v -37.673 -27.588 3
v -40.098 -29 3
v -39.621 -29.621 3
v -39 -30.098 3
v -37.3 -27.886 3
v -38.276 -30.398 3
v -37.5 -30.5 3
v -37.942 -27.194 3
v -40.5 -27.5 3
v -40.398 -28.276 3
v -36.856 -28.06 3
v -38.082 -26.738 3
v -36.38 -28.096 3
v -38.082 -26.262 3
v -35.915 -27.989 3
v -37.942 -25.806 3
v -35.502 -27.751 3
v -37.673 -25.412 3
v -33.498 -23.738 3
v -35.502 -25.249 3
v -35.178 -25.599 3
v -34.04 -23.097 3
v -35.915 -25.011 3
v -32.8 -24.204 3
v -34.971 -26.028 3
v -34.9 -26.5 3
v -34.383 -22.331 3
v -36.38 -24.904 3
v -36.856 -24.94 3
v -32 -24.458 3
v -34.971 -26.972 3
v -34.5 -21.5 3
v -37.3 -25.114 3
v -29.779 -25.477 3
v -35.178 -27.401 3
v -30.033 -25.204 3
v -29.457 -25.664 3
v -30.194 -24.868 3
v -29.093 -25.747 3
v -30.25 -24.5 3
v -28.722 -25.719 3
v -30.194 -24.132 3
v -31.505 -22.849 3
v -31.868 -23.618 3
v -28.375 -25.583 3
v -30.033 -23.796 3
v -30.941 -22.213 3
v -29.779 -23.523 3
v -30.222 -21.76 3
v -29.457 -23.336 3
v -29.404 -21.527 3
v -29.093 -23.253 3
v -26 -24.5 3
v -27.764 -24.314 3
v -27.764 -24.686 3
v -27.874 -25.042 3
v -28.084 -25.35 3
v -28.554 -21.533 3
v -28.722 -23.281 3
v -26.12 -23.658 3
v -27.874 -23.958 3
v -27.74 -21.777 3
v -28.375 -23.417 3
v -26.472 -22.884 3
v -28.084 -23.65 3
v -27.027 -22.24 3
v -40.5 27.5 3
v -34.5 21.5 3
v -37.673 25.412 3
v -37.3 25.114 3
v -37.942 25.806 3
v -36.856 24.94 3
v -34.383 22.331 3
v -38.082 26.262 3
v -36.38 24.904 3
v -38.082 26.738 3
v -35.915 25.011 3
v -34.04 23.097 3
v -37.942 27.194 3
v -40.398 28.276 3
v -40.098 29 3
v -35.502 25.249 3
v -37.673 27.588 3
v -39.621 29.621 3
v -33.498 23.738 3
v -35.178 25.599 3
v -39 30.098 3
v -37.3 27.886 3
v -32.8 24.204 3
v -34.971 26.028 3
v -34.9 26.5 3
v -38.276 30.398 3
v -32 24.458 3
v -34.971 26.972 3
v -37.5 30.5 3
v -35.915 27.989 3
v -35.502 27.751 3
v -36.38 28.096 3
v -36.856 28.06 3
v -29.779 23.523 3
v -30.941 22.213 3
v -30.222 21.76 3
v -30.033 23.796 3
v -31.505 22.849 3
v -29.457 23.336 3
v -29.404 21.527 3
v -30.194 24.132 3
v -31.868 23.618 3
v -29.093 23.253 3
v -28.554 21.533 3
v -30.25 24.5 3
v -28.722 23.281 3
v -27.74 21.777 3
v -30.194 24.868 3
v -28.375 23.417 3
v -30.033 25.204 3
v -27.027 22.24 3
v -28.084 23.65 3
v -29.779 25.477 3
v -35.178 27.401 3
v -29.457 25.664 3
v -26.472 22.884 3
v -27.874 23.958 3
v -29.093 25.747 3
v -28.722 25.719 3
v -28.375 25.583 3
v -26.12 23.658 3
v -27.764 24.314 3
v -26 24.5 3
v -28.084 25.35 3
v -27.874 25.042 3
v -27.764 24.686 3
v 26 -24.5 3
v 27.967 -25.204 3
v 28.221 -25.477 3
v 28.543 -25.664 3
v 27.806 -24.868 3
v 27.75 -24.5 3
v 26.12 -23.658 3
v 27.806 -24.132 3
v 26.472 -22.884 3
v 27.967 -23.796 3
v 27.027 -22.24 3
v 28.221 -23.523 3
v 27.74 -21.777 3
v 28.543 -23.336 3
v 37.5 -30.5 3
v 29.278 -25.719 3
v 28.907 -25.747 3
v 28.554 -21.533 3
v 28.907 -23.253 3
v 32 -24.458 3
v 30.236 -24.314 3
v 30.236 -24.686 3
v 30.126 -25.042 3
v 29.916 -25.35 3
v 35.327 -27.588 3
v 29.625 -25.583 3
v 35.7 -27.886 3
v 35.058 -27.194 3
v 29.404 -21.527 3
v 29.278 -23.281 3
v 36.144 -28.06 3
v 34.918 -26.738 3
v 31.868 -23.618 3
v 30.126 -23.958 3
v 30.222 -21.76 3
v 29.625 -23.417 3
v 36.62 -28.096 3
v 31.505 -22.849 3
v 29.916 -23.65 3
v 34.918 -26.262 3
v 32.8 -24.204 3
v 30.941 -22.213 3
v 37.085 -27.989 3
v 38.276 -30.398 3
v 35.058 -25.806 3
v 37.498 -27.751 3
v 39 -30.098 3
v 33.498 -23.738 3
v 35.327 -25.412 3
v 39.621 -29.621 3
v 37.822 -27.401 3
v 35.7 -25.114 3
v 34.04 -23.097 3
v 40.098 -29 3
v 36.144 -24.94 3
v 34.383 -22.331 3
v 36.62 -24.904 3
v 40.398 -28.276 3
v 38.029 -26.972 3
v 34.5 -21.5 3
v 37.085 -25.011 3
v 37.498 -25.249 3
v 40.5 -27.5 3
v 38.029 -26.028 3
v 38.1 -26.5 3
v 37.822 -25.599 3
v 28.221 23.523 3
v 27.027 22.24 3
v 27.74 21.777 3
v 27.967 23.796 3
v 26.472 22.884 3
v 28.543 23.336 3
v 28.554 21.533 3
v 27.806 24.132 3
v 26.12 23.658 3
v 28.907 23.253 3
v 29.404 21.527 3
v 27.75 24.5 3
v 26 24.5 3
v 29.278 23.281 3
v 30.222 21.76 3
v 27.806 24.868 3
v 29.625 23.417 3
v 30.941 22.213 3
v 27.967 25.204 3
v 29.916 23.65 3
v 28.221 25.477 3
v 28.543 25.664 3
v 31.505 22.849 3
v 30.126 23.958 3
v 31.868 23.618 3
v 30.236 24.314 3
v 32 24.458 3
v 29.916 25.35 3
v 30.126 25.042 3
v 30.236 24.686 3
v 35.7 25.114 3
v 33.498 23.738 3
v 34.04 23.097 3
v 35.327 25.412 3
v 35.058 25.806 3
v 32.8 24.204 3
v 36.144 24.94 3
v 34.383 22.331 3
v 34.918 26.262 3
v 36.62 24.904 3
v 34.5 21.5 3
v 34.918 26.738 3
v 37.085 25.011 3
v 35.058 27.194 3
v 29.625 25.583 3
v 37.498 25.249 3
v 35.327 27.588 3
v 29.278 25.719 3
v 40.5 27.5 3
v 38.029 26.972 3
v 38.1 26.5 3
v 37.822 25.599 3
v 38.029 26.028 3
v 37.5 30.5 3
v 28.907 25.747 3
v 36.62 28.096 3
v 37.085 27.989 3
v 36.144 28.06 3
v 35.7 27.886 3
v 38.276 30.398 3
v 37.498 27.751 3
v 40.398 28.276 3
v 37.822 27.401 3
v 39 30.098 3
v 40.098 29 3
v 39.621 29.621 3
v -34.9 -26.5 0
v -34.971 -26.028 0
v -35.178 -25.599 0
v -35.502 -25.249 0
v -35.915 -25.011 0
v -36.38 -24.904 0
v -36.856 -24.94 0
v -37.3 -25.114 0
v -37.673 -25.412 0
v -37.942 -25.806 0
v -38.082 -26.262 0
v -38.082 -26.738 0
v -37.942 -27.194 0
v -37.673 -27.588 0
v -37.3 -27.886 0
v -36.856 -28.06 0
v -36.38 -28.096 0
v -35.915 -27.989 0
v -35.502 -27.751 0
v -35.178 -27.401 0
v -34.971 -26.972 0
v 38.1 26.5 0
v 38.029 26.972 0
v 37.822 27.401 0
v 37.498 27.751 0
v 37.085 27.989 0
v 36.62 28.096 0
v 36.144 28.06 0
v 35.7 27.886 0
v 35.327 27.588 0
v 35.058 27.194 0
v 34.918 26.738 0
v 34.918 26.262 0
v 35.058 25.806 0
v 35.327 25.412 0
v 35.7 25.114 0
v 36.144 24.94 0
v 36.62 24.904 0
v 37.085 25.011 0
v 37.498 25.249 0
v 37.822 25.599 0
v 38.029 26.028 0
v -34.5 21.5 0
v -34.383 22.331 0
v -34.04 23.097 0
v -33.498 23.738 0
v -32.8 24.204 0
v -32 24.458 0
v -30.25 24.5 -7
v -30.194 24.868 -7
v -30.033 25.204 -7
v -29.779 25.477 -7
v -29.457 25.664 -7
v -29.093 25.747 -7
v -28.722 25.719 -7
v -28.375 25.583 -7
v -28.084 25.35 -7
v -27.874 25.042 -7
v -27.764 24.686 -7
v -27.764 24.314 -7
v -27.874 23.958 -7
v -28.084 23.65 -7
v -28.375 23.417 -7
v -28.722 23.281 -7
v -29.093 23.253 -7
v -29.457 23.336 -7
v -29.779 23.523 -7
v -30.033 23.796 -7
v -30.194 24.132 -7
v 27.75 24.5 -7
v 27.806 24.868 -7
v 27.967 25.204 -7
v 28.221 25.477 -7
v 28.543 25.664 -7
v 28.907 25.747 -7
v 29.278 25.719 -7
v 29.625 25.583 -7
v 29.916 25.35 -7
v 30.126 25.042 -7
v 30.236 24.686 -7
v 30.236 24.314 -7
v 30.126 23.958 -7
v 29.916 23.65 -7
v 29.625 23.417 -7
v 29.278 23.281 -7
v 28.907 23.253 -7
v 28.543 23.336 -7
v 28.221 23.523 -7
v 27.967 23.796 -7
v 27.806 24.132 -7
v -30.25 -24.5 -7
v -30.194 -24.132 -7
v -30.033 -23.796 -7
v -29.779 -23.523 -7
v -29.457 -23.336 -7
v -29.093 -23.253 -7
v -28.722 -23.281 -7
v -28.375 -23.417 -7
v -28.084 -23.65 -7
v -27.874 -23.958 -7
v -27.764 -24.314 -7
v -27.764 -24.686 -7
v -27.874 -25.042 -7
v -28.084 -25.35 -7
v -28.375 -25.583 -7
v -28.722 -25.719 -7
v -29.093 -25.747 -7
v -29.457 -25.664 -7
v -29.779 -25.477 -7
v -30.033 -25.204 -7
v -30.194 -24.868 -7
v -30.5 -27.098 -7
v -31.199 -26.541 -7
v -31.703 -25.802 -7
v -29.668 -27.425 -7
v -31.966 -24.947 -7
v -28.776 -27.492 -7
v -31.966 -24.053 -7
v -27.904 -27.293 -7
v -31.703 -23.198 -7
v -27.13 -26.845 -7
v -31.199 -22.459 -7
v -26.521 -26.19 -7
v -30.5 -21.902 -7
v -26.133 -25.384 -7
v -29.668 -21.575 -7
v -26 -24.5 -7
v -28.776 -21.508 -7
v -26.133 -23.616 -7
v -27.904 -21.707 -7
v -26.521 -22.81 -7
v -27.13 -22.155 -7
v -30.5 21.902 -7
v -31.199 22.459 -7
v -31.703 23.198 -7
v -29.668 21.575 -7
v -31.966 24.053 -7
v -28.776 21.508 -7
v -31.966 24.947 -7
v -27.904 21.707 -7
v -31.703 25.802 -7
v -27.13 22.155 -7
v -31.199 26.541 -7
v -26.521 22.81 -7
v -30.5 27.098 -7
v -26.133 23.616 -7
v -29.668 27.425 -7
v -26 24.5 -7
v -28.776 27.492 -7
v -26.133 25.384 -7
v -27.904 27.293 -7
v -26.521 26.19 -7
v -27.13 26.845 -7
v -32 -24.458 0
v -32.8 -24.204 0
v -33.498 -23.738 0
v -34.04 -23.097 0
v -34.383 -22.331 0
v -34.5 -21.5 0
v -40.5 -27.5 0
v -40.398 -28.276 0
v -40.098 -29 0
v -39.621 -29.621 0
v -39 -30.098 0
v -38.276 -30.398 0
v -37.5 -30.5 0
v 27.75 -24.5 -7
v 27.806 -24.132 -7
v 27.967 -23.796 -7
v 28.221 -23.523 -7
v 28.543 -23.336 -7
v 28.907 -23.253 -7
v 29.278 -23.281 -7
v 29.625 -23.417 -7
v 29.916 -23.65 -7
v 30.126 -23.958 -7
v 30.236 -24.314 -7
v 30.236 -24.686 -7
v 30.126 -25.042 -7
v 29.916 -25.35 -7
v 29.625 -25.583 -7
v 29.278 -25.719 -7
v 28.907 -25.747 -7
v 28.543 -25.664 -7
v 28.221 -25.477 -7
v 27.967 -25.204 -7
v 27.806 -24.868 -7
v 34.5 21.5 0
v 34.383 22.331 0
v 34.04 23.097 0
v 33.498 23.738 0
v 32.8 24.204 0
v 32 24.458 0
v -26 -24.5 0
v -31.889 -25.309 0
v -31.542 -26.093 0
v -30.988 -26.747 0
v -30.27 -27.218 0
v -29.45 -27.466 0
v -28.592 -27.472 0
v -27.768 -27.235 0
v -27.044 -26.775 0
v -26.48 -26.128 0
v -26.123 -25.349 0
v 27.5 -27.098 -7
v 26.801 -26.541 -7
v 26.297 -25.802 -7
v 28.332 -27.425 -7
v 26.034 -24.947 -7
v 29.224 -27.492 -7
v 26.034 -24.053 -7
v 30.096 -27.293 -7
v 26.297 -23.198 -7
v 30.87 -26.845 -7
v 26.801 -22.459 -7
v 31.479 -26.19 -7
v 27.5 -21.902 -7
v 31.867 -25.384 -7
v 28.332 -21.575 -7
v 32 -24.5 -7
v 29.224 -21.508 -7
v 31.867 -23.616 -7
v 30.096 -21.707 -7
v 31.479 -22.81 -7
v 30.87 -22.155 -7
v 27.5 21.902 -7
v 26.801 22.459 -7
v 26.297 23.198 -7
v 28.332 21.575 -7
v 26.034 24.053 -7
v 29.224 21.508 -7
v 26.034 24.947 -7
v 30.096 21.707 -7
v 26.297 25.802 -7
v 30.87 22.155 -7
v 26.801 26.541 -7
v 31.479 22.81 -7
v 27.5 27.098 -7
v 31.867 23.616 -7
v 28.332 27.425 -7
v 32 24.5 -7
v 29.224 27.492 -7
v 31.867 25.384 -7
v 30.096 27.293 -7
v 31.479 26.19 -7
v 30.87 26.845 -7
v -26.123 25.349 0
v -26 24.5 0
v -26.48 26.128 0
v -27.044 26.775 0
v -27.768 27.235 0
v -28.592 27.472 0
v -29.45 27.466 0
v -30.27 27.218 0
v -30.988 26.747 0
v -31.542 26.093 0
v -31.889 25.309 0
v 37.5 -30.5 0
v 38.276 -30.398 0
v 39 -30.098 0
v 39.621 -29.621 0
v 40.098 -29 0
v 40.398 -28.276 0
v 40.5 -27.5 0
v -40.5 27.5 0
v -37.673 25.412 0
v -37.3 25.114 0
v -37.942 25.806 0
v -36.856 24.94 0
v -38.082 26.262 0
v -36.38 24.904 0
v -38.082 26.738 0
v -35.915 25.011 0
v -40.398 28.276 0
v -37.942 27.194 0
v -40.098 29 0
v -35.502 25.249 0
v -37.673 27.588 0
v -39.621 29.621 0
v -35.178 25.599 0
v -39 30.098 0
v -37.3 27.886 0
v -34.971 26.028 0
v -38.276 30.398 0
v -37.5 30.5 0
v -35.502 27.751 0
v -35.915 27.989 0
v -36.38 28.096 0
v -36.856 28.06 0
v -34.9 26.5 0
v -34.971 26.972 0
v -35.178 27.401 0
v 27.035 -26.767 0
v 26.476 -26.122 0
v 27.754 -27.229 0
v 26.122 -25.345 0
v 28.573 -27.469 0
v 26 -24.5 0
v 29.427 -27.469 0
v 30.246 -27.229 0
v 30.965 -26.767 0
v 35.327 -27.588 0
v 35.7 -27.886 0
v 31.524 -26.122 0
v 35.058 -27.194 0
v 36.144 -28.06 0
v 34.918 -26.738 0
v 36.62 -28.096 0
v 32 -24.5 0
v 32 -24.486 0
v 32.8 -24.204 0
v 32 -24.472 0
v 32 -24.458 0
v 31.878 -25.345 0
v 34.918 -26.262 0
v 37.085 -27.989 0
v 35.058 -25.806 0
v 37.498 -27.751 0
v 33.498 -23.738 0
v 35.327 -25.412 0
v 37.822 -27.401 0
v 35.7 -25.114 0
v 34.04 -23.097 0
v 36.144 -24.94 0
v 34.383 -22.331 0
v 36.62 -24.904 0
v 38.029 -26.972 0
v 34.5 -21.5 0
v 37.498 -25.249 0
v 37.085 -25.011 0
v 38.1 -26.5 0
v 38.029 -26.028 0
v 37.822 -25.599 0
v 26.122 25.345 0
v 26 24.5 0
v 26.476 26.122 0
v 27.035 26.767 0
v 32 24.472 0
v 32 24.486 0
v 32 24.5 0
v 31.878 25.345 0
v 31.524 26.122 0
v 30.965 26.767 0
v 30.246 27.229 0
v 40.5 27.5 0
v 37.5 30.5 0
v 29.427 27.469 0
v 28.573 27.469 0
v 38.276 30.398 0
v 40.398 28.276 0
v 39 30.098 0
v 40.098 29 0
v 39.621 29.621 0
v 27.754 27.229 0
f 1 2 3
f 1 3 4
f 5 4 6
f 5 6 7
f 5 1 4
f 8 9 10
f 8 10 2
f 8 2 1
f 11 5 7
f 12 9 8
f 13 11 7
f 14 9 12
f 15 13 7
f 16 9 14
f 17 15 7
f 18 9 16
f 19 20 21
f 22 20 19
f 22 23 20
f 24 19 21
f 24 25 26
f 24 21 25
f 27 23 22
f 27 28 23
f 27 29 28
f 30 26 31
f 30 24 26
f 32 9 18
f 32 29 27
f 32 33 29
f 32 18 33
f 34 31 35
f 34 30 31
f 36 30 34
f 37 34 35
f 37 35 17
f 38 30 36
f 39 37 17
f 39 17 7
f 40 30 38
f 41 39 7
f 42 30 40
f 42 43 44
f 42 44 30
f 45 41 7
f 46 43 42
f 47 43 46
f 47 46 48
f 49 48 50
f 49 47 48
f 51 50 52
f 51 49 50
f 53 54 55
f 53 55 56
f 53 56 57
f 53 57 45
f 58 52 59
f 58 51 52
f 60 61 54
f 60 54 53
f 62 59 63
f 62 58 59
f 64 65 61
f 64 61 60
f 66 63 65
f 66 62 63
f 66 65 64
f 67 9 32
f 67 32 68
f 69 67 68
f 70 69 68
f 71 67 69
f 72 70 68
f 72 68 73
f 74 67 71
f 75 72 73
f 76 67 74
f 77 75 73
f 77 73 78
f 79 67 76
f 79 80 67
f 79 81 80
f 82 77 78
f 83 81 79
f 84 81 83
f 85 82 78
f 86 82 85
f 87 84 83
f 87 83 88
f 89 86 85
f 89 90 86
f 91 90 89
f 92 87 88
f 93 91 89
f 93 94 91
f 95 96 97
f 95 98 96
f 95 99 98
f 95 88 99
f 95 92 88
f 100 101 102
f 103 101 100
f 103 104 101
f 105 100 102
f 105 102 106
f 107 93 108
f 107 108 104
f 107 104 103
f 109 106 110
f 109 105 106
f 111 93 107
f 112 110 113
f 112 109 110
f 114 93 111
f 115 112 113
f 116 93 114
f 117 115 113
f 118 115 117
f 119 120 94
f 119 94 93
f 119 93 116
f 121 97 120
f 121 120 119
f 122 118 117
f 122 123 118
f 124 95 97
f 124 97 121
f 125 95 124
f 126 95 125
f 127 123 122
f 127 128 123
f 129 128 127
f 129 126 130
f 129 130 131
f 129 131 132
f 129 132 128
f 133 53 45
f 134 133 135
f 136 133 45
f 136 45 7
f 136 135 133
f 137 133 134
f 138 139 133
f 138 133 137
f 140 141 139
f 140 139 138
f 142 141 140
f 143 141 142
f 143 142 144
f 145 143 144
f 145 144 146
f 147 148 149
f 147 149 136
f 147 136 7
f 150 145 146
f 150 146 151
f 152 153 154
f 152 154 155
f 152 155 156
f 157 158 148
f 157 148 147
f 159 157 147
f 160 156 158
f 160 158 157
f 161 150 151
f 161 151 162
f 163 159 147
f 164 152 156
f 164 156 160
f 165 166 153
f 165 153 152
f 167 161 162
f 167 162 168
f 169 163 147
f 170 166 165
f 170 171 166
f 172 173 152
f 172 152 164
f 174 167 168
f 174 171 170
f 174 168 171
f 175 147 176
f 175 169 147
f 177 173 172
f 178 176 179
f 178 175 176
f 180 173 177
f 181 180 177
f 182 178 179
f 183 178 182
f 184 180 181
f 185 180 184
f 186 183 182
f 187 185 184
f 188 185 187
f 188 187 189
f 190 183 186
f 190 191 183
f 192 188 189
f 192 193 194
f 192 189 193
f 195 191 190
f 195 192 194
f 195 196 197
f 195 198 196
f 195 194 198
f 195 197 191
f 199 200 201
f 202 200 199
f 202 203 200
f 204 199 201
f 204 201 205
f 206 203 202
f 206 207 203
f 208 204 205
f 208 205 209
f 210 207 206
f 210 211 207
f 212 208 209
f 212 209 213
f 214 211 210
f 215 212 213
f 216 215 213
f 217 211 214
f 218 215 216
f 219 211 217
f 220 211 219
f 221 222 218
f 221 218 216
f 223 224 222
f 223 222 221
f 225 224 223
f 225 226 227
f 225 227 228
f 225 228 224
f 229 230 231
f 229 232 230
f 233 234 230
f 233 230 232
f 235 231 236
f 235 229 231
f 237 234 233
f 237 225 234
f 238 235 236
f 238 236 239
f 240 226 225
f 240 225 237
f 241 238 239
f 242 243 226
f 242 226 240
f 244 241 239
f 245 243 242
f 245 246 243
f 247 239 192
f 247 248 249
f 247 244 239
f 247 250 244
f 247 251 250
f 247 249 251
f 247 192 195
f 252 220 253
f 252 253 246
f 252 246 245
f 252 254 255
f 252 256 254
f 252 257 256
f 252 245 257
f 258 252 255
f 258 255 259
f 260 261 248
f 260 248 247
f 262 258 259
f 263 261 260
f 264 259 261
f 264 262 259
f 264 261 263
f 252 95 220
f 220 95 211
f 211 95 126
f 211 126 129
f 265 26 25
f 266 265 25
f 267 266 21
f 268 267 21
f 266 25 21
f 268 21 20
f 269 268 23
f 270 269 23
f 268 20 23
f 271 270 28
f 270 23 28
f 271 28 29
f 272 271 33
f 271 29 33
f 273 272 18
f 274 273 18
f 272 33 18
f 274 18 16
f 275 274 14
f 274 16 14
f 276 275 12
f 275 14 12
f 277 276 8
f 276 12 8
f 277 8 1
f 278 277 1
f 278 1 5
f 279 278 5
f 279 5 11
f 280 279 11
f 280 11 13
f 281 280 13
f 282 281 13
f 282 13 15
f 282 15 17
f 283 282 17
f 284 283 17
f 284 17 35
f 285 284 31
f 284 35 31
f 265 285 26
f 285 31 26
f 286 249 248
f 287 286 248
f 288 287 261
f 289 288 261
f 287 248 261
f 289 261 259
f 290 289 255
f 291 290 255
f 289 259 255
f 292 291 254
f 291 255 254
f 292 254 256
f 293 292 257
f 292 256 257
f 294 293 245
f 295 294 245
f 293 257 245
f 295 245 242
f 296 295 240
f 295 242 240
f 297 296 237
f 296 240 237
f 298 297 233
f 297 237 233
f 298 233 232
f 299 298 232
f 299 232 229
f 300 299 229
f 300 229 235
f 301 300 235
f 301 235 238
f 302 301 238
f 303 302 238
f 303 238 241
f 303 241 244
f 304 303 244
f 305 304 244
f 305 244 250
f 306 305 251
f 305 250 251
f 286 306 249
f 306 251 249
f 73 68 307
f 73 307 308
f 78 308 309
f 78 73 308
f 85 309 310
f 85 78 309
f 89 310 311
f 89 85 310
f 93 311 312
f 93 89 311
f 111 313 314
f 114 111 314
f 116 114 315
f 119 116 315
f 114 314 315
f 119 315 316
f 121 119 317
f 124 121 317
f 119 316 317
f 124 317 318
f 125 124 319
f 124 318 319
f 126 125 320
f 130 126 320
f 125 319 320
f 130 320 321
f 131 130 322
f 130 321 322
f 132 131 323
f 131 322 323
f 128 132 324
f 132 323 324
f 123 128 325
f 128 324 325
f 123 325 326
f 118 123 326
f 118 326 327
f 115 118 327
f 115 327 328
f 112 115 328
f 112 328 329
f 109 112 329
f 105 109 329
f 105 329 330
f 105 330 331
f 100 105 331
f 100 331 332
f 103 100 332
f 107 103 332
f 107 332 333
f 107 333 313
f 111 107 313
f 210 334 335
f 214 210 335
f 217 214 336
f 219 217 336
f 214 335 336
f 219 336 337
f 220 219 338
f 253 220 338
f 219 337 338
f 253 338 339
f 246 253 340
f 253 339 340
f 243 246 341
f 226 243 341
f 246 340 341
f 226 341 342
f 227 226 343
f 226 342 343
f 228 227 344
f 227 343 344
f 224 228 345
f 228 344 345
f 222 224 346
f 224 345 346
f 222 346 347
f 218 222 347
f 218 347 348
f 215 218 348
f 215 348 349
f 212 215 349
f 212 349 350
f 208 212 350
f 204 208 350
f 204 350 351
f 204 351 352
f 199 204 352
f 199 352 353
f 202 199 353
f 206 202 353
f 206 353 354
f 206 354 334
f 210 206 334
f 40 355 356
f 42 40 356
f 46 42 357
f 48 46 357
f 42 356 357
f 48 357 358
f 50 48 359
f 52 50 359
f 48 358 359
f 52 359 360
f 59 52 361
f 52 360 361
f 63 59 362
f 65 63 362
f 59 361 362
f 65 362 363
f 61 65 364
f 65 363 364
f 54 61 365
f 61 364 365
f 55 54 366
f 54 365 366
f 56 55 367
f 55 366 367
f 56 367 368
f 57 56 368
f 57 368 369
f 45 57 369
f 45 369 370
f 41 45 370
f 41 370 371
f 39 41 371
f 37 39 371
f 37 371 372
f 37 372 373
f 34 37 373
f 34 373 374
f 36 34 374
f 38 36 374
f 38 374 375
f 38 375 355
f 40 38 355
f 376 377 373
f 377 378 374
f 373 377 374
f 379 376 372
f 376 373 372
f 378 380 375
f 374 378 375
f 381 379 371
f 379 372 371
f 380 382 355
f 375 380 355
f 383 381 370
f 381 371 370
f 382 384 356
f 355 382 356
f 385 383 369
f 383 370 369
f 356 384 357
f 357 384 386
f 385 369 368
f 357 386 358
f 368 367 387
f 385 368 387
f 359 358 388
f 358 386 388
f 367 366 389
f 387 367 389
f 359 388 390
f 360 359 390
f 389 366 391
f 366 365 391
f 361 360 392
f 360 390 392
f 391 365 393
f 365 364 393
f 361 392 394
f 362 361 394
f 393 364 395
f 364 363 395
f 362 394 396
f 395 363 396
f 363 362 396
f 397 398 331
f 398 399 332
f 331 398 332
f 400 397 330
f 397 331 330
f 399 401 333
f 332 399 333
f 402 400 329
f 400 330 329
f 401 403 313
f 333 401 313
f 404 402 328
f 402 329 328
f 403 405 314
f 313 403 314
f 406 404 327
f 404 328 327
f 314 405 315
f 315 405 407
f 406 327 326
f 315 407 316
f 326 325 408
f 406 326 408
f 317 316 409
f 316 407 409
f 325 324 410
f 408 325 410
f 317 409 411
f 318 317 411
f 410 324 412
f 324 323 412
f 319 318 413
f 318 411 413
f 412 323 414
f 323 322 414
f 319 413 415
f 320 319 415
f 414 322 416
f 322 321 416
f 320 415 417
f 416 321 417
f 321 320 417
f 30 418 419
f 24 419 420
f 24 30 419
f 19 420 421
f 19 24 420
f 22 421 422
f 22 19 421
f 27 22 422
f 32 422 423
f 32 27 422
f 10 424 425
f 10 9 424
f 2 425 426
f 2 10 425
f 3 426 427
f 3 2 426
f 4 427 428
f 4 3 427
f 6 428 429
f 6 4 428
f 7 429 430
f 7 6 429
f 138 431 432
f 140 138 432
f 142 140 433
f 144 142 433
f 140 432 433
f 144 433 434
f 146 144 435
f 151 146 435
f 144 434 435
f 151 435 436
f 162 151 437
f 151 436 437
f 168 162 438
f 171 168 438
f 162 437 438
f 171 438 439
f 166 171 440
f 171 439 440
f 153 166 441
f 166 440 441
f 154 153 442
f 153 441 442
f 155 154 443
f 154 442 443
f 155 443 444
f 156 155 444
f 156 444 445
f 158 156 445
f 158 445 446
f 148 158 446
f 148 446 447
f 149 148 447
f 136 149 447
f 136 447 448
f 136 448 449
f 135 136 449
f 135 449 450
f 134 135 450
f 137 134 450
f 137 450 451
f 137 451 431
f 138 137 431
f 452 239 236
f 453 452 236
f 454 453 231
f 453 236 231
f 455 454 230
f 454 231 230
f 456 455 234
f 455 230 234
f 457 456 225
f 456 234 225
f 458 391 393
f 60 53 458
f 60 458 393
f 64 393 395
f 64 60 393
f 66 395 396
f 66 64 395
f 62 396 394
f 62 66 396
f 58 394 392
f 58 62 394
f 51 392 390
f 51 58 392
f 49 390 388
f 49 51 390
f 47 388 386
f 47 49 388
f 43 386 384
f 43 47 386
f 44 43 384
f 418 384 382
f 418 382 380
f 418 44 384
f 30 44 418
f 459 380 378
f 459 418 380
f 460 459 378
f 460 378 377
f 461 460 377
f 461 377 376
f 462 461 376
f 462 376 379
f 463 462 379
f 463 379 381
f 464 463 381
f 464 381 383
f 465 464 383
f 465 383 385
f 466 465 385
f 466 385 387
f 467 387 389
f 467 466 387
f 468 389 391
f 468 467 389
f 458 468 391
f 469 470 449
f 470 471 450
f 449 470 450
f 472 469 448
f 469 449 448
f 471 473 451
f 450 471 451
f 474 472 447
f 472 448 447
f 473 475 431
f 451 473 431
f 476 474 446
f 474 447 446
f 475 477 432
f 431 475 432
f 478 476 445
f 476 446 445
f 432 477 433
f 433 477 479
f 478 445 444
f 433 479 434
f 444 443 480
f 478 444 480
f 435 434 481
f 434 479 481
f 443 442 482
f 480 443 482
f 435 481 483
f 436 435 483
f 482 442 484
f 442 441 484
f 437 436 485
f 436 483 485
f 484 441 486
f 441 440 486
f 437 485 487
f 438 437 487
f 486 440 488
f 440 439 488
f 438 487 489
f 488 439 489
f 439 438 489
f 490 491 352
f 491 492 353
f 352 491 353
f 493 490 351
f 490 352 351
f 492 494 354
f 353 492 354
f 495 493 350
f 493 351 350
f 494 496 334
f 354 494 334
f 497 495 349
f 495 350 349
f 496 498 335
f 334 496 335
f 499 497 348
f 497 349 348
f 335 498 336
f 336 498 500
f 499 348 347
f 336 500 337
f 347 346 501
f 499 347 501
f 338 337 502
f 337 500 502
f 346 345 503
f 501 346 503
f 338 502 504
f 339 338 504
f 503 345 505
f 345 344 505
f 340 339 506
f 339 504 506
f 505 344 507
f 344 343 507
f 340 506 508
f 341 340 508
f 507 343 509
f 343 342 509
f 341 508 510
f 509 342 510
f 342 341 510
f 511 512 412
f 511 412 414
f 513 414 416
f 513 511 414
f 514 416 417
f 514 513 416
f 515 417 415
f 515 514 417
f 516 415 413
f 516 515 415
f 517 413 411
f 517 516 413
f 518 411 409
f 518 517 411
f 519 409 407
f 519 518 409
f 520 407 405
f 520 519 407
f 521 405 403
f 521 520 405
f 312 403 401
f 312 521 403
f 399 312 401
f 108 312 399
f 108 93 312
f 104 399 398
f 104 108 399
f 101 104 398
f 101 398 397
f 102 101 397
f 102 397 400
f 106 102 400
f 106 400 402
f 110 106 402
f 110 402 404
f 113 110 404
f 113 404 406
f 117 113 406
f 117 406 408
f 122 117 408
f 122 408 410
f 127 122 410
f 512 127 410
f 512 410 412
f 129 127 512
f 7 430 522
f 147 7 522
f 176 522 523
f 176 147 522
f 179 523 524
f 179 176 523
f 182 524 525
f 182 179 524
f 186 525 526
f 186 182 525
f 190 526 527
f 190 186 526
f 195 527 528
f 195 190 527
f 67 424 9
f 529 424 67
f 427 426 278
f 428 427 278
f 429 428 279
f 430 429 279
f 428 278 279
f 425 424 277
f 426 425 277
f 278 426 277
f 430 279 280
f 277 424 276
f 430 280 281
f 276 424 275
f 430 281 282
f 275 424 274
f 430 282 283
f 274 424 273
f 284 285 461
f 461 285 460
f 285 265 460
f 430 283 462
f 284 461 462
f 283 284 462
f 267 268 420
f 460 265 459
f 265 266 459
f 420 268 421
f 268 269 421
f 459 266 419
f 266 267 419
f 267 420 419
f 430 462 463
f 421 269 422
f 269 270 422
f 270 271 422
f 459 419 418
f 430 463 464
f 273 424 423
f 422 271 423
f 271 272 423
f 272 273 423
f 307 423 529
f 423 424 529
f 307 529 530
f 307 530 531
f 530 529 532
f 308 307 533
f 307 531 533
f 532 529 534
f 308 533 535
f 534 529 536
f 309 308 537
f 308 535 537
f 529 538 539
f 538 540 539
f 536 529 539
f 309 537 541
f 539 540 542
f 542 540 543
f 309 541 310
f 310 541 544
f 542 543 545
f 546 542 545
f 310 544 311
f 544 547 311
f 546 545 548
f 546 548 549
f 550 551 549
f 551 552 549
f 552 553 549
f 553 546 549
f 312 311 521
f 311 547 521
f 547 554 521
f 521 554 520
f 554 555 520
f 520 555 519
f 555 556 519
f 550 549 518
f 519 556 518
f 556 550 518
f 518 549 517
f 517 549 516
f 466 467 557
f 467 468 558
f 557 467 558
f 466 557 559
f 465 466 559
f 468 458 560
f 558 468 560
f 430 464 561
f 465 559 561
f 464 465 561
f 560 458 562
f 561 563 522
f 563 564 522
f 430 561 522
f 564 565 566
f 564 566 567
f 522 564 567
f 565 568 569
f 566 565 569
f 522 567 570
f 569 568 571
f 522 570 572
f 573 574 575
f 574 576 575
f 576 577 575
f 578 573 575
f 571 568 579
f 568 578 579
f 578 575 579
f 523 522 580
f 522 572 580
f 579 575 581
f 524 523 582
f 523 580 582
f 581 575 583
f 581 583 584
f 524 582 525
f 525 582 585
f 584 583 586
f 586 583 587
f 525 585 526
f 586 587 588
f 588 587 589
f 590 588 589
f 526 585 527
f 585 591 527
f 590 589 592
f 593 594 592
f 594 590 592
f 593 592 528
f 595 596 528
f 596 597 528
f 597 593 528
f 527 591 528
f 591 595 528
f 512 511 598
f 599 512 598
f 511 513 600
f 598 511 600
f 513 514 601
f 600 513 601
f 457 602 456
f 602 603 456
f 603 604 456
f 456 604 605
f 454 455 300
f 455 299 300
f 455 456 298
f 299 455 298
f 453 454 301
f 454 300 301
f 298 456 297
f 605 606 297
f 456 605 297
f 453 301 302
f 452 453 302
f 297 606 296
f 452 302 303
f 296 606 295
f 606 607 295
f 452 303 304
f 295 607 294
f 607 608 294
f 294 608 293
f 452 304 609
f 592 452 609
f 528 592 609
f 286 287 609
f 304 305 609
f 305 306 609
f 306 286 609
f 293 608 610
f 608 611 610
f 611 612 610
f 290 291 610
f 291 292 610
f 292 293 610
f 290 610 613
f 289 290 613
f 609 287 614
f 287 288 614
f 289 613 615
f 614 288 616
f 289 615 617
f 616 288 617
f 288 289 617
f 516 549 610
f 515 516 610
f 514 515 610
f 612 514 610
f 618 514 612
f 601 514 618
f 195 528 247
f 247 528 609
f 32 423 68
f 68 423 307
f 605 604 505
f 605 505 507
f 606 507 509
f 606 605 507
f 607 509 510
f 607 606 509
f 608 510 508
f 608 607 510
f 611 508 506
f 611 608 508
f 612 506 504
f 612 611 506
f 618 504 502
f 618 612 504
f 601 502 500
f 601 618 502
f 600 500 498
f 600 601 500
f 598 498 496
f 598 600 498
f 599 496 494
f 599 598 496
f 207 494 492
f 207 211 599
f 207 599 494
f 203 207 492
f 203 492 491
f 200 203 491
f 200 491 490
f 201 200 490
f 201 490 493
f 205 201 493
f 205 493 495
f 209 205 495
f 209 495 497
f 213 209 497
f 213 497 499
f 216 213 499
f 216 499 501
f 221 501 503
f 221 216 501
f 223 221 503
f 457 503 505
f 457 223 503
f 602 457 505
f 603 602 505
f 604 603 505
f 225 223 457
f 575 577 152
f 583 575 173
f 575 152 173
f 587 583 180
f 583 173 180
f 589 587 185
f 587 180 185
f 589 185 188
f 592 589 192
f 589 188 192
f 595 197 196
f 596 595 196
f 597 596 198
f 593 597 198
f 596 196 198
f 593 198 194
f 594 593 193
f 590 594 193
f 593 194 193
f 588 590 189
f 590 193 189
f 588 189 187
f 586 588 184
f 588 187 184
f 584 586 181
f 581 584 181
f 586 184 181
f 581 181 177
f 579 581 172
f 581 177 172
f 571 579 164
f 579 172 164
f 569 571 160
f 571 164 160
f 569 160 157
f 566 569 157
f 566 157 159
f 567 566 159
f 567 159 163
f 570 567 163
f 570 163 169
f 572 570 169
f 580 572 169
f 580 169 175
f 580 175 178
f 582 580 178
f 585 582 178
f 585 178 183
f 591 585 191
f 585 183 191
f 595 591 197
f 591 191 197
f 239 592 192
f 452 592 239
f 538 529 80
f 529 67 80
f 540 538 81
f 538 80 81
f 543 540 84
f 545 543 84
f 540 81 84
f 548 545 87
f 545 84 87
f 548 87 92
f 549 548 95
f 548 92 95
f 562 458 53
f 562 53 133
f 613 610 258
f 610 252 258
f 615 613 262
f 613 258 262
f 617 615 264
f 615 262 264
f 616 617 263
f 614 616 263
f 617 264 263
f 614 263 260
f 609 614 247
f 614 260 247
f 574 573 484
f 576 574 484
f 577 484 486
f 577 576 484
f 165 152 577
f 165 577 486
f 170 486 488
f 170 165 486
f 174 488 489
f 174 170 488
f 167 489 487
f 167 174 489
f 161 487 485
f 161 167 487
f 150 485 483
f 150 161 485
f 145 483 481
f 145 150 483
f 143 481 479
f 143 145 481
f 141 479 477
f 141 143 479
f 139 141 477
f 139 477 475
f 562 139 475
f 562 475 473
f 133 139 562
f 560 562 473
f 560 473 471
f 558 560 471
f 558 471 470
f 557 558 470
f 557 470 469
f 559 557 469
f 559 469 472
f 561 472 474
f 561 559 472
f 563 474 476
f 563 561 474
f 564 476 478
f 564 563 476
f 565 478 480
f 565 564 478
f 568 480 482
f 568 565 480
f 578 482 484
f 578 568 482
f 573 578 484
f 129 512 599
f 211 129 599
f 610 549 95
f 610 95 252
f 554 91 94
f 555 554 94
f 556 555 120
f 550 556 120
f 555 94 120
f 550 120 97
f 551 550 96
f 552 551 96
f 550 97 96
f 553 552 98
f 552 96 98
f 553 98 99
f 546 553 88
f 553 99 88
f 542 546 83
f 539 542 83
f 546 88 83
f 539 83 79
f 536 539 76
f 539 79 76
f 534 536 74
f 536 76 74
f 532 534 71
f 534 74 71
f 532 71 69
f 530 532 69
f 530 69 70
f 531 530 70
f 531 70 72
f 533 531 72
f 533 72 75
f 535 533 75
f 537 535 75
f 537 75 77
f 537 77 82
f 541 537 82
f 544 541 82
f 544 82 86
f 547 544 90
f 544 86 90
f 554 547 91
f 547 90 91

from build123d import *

# Parameters (mm, degrees)
SKETCH1_W           = 81
SKETCH1_H           = 61
SKETCH1_W_2         = 69
SKETCH1_H_2         = 49
EXTRUDE_THIN1_DEPTH = 3
SKETCH2_R           = 1.6
CUT_EXTRUDE1_DEPTH  = 3
FILLET1_R           = 3
SKETCH4_R           = 3
BOSS_EXTRUDE1_DEPTH = 10
CUT_EXTRUDE2_REACH  = 12
SKETCH5_R           = 1.25


with BuildPart() as part:
    # Sketch1 → Extrude-Thin1 (new body)
    with BuildSketch(Plane.XY):
        Rectangle(SKETCH1_W, SKETCH1_H)
        Rectangle(SKETCH1_W_2, SKETCH1_H_2, mode=Mode.SUBTRACT)
    extrude(amount=EXTRUDE_THIN1_DEPTH)

    # Sketch2 → Cut-Extrude1 (cut)
    with BuildSketch(Plane.XY.offset(3)):
        with Locations((-36.5, 26.5)):
            Circle(SKETCH2_R)
        with Locations((36.5, 26.5)):
            Circle(SKETCH2_R)
        with Locations((36.5, -26.5)):
            Circle(SKETCH2_R)
        with Locations((-36.5, -26.5)):
            Circle(SKETCH2_R)
    extrude(amount=-CUT_EXTRUDE1_DEPTH, mode=Mode.SUBTRACT)

    # Fillet1
    fillet1_edges = [part.edges().sort_by_distance(p)[0] for p in [
        (-34.5, 24.5, 1.5),
        (-34.5, -24.5, 1.5),
        (34.5, -24.5, 1.5),
        (34.5, 24.5, 1.5),
        (-40.5, 30.5, 1.5),
        (40.5, 30.5, 1.5),
        (40.5, -30.5, 1.5),
        (-40.5, -30.5, 1.5),
    ]]
    fillet(fillet1_edges, radius=FILLET1_R)

    # Sketch4 → Boss-Extrude1 (add)
    with BuildSketch(Plane.XY.offset(3)):
        with Locations((-29, 24.5)):
            Circle(SKETCH4_R)
        with Locations((29, 24.5)):
            Circle(SKETCH4_R)
        with Locations((29, -24.5)):
            Circle(SKETCH4_R)
        with Locations((-29, -24.5)):
            Circle(SKETCH4_R)
    extrude(amount=-BOSS_EXTRUDE1_DEPTH)

    # Sketch5 → Cut-Extrude2 (cut, up to next)
    with BuildSketch(Plane(origin=(0, 0, -7), x_dir=(-1, 0, 0), z_dir=(0, 0, -1)), mode=Mode.PRIVATE) as cut_extrude2_sk1:
        with Locations((-29, 24.5)):
            Circle(SKETCH5_R)
    cut_extrude2_tool1 = extrude(cut_extrude2_sk1.sketch, amount=-CUT_EXTRUDE2_REACH, mode=Mode.PRIVATE) & part.part
    add(cut_extrude2_tool1.solids().sort_by_distance((29, 24.5, -7))[0], mode=Mode.SUBTRACT)
    # Sketch5 → Cut-Extrude2 (cut, up to next)
    with BuildSketch(Plane(origin=(0, 0, -7), x_dir=(-1, 0, 0), z_dir=(0, 0, -1)), mode=Mode.PRIVATE) as cut_extrude2_sk2:
        with Locations((29, 24.5)):
            Circle(SKETCH5_R)
    cut_extrude2_tool2 = extrude(cut_extrude2_sk2.sketch, amount=-CUT_EXTRUDE2_REACH, mode=Mode.PRIVATE) & part.part
    add(cut_extrude2_tool2.solids().sort_by_distance((-29, 24.5, -7))[0], mode=Mode.SUBTRACT)
    # Sketch5 → Cut-Extrude2 (cut, up to next)
    with BuildSketch(Plane(origin=(0, 0, -7), x_dir=(-1, 0, 0), z_dir=(0, 0, -1)), mode=Mode.PRIVATE) as cut_extrude2_sk3:
        with Locations((-29, -24.5)):
            Circle(SKETCH5_R)
    cut_extrude2_tool3 = extrude(cut_extrude2_sk3.sketch, amount=-CUT_EXTRUDE2_REACH, mode=Mode.PRIVATE) & part.part
    add(cut_extrude2_tool3.solids().sort_by_distance((29, -24.5, -7))[0], mode=Mode.SUBTRACT)
    # Sketch5 → Cut-Extrude2 (cut, up to next)
    with BuildSketch(Plane(origin=(0, 0, -7), x_dir=(-1, 0, 0), z_dir=(0, 0, -1)), mode=Mode.PRIVATE) as cut_extrude2_sk4:
        with Locations((29, -24.5)):
            Circle(SKETCH5_R)
    cut_extrude2_tool4 = extrude(cut_extrude2_sk4.sketch, amount=-CUT_EXTRUDE2_REACH, mode=Mode.PRIVATE) & part.part
    add(cut_extrude2_tool4.solids().sort_by_distance((-29, -24.5, -7))[0], mode=Mode.SUBTRACT)


solid = part.part
